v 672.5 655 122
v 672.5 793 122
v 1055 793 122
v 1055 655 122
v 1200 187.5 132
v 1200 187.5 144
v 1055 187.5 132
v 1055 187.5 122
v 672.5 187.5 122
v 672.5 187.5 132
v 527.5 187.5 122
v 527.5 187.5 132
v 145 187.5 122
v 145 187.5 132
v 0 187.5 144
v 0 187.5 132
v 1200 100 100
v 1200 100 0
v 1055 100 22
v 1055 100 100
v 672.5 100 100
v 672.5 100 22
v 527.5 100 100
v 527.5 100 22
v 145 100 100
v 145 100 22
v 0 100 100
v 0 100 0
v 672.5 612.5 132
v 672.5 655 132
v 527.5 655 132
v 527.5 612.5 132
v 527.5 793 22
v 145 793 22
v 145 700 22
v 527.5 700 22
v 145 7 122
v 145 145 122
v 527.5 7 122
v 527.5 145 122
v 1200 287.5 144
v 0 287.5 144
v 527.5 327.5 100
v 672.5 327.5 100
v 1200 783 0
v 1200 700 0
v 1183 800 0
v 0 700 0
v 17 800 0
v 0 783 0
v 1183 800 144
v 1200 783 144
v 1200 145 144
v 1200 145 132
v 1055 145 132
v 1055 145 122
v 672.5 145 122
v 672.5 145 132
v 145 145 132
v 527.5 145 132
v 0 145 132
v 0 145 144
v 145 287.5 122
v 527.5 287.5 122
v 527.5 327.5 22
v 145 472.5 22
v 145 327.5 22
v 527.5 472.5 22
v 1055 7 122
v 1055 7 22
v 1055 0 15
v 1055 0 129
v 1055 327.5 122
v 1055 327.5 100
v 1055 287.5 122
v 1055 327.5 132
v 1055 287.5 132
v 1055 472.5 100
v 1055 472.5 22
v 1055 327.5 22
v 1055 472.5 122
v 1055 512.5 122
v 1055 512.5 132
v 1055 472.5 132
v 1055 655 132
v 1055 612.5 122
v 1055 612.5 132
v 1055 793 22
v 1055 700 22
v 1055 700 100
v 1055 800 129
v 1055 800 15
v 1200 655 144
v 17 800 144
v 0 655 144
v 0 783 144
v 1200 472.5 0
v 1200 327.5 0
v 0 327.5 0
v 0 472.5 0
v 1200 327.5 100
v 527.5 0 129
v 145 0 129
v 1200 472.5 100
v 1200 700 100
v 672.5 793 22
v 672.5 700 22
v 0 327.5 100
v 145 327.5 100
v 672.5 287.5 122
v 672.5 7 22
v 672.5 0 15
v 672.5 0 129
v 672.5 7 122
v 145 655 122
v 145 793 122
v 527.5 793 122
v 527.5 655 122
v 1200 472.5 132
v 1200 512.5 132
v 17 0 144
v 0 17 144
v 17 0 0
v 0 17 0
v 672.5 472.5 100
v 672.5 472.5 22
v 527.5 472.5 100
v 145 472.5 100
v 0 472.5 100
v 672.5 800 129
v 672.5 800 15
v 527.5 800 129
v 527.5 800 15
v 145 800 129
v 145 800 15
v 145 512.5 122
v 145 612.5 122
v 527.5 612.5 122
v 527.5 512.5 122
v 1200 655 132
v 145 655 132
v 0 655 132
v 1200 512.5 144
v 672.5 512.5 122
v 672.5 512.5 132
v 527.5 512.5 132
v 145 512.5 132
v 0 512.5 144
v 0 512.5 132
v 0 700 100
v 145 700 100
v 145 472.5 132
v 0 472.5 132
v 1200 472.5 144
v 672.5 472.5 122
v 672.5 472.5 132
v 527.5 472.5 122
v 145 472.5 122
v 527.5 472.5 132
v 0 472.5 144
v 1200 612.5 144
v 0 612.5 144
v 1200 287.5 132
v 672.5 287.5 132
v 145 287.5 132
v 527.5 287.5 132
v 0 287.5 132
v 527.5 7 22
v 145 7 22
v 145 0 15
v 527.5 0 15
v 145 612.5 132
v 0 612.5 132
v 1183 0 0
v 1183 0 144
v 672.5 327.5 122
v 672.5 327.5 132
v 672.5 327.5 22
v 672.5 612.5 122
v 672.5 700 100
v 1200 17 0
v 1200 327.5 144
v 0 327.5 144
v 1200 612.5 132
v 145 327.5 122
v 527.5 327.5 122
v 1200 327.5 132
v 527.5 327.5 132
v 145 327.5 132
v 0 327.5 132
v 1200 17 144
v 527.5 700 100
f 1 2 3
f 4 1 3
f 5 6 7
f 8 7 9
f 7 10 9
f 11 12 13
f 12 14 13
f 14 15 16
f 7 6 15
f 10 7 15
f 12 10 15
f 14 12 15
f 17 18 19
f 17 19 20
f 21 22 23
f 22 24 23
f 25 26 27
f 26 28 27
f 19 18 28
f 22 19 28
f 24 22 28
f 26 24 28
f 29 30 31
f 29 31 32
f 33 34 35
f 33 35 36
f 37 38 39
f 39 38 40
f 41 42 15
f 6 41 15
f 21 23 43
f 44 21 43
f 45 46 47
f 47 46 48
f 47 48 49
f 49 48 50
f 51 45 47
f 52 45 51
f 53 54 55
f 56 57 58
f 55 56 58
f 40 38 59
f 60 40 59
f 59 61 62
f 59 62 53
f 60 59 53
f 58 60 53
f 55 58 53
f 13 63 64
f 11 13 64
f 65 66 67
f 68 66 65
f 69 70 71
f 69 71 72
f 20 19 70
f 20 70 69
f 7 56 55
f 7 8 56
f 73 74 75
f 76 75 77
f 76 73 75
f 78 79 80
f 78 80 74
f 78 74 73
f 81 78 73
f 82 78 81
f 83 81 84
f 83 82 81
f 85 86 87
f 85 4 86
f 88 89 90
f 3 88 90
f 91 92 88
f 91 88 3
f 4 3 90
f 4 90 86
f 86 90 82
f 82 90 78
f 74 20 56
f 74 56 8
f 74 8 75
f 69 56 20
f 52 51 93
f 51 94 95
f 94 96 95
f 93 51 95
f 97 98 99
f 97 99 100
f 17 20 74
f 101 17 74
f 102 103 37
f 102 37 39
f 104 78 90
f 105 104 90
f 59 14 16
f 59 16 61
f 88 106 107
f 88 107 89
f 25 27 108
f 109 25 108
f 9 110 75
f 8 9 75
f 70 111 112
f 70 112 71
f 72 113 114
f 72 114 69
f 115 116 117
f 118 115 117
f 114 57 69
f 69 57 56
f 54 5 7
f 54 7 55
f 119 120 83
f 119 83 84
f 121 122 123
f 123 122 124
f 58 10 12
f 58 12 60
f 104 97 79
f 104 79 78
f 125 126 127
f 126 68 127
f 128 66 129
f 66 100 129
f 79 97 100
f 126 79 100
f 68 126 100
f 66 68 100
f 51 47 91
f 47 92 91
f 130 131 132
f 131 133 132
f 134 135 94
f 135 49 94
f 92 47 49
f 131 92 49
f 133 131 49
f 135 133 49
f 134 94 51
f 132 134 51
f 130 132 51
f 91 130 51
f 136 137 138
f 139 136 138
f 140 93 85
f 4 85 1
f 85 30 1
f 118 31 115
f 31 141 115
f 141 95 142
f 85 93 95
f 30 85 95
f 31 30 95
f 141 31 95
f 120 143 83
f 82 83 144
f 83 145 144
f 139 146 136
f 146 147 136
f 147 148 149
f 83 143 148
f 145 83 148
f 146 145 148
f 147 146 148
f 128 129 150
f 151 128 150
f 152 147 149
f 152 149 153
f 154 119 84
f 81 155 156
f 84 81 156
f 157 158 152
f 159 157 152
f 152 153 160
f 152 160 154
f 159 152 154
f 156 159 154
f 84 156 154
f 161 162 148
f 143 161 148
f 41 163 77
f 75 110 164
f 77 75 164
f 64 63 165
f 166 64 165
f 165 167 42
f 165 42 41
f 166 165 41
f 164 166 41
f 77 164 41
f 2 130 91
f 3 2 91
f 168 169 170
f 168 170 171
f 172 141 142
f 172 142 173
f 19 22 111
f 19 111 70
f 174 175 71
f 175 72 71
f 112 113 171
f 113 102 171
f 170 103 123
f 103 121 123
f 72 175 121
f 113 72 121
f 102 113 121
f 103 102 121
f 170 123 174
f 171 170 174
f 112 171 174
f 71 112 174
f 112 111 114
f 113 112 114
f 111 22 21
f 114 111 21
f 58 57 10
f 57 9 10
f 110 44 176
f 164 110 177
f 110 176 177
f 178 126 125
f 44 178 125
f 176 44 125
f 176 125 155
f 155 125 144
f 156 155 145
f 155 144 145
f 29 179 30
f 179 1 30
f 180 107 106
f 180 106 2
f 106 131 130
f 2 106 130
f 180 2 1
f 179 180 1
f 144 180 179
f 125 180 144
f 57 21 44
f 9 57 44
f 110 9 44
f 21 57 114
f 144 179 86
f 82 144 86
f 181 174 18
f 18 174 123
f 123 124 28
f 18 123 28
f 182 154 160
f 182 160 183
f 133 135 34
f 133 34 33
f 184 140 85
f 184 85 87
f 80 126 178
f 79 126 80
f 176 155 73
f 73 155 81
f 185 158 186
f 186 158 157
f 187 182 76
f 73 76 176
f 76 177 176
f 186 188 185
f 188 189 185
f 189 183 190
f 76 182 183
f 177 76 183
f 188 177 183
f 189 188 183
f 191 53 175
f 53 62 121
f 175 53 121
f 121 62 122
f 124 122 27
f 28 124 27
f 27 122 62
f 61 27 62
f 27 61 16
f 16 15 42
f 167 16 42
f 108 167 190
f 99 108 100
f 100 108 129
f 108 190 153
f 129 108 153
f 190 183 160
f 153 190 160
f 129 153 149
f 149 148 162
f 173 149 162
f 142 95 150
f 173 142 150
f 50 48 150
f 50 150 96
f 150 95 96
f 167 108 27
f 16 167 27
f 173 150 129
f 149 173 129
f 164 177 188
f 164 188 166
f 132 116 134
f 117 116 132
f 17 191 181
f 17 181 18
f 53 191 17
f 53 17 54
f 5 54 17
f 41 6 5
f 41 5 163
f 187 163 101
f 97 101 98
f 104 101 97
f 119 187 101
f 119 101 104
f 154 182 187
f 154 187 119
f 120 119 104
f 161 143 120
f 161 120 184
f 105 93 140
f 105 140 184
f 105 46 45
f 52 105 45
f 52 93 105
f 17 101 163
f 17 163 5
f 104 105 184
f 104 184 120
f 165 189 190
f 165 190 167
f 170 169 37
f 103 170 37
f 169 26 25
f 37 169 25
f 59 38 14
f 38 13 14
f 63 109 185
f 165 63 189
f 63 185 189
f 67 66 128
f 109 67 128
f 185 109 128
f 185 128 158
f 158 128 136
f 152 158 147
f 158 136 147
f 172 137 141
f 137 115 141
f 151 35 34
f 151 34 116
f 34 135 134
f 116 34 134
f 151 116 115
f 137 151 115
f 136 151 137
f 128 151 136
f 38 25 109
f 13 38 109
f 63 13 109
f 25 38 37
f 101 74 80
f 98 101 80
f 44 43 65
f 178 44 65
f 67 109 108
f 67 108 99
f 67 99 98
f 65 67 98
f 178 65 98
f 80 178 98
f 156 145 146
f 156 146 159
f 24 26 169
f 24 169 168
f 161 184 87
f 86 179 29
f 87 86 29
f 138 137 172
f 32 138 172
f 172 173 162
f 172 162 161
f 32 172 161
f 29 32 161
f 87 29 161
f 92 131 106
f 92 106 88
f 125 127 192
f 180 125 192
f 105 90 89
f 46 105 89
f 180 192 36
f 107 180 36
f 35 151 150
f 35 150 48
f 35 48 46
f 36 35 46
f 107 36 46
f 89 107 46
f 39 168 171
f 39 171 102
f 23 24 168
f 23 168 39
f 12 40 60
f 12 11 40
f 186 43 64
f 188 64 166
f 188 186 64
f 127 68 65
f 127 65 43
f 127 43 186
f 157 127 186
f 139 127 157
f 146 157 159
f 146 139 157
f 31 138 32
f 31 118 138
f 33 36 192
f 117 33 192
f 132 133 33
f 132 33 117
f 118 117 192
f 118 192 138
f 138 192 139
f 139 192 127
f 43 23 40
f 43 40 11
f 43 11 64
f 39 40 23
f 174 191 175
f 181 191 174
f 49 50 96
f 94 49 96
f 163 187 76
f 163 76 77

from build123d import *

# Parameters (mm, degrees)
PAD_DEPTH       = 1200
CHAMFER_SIZE    = 17
SKETCH001_W     = 382.5
SKETCH001_H     = 42.5
SKETCH001_H_2   = 40
POCKET_DEPTH    = 144
SKETCH002_W     = 100
SKETCH002_H     = 382.5
POCKET001_DEPTH = 800
CHAMFER001_SIZE = 7
CHAMFER002_SIZE = 7


with BuildPart() as part:
    # Sketch → Pad (new body)
    with BuildSketch(Plane.YZ):
        Polygon((800, 0), (800, 144), (655, 144), (655, 132), (612.5, 132), (612.5, 144), (512.5, 144), (512.5, 132), (472.5, 132), (472.5, 144), (327.5, 144), (327.5, 132), (287.5, 132), (287.5, 144), (187.5, 144), (187.5, 132), (145, 132), (145, 144), (0, 144), (0, 0), (100, 0), (100, 100), (327.5, 100), (327.5, 0), (472.5, 0), (472.5, 100), (700, 100), (700, 0), align=None)
    extrude(amount=PAD_DEPTH)

    # Chamfer
    chamfer_edges = [part.edges().sort_by_distance(p)[0] for p in [
        (1200, 0, 72),
        (0, 0, 72),
        (0, 800, 72),
        (1200, 800, 72),
    ]]
    chamfer(chamfer_edges, length=CHAMFER_SIZE)

    # Sketch001 → Pocket (cut)
    with BuildSketch(Plane.XY):
        with Locations((336.25, 166.25)):
            Rectangle(SKETCH001_W, SKETCH001_H)
        with Locations((863.75, 166.25)):
            Rectangle(SKETCH001_W, SKETCH001_H)
        with Locations((336.25, 307.5)):
            Rectangle(SKETCH001_W, SKETCH001_H_2)
        with Locations((863.75, 307.5)):
            Rectangle(SKETCH001_W, SKETCH001_H_2)
        with Locations((336.25, 492.5)):
            Rectangle(SKETCH001_W, SKETCH001_H_2)
        with Locations((863.75, 492.5)):
            Rectangle(SKETCH001_W, SKETCH001_H_2)
        with Locations((336.25, 633.75)):
            Rectangle(SKETCH001_W, SKETCH001_H)
        with Locations((863.75, 633.75)):
            Rectangle(SKETCH001_W, SKETCH001_H)
    extrude(amount=POCKET_DEPTH, mode=Mode.SUBTRACT)

    # Sketch002 (on Face2 of Pocket) → Pocket001 (cut)
    with BuildSketch(Plane.ZX.offset(800)):
        with Locations((72, 863.75)):
            Rectangle(SKETCH002_W, SKETCH002_H)
        with Locations((72, 336.25)):
            Rectangle(SKETCH002_W, SKETCH002_H)
    extrude(amount=-POCKET001_DEPTH, mode=Mode.SUBTRACT)

    # Chamfer001
    chamfer001_edges = [part.edges().sort_by_distance(p)[0] for p in [
        (863.75, 0, 22),
        (336.25, 0, 22),
        (863.75, 0, 122),
        (336.25, 0, 122),
    ]]
    chamfer(chamfer001_edges, length=CHAMFER001_SIZE)

    # Chamfer002
    chamfer002_edges = [part.edges().sort_by_distance(p)[0] for p in [
        (863.75, 800, 22),
        (863.75, 800, 122),
        (336.25, 800, 122),
        (336.25, 800, 22),
    ]]
    chamfer(chamfer002_edges, length=CHAMFER002_SIZE)


solid = part.part
